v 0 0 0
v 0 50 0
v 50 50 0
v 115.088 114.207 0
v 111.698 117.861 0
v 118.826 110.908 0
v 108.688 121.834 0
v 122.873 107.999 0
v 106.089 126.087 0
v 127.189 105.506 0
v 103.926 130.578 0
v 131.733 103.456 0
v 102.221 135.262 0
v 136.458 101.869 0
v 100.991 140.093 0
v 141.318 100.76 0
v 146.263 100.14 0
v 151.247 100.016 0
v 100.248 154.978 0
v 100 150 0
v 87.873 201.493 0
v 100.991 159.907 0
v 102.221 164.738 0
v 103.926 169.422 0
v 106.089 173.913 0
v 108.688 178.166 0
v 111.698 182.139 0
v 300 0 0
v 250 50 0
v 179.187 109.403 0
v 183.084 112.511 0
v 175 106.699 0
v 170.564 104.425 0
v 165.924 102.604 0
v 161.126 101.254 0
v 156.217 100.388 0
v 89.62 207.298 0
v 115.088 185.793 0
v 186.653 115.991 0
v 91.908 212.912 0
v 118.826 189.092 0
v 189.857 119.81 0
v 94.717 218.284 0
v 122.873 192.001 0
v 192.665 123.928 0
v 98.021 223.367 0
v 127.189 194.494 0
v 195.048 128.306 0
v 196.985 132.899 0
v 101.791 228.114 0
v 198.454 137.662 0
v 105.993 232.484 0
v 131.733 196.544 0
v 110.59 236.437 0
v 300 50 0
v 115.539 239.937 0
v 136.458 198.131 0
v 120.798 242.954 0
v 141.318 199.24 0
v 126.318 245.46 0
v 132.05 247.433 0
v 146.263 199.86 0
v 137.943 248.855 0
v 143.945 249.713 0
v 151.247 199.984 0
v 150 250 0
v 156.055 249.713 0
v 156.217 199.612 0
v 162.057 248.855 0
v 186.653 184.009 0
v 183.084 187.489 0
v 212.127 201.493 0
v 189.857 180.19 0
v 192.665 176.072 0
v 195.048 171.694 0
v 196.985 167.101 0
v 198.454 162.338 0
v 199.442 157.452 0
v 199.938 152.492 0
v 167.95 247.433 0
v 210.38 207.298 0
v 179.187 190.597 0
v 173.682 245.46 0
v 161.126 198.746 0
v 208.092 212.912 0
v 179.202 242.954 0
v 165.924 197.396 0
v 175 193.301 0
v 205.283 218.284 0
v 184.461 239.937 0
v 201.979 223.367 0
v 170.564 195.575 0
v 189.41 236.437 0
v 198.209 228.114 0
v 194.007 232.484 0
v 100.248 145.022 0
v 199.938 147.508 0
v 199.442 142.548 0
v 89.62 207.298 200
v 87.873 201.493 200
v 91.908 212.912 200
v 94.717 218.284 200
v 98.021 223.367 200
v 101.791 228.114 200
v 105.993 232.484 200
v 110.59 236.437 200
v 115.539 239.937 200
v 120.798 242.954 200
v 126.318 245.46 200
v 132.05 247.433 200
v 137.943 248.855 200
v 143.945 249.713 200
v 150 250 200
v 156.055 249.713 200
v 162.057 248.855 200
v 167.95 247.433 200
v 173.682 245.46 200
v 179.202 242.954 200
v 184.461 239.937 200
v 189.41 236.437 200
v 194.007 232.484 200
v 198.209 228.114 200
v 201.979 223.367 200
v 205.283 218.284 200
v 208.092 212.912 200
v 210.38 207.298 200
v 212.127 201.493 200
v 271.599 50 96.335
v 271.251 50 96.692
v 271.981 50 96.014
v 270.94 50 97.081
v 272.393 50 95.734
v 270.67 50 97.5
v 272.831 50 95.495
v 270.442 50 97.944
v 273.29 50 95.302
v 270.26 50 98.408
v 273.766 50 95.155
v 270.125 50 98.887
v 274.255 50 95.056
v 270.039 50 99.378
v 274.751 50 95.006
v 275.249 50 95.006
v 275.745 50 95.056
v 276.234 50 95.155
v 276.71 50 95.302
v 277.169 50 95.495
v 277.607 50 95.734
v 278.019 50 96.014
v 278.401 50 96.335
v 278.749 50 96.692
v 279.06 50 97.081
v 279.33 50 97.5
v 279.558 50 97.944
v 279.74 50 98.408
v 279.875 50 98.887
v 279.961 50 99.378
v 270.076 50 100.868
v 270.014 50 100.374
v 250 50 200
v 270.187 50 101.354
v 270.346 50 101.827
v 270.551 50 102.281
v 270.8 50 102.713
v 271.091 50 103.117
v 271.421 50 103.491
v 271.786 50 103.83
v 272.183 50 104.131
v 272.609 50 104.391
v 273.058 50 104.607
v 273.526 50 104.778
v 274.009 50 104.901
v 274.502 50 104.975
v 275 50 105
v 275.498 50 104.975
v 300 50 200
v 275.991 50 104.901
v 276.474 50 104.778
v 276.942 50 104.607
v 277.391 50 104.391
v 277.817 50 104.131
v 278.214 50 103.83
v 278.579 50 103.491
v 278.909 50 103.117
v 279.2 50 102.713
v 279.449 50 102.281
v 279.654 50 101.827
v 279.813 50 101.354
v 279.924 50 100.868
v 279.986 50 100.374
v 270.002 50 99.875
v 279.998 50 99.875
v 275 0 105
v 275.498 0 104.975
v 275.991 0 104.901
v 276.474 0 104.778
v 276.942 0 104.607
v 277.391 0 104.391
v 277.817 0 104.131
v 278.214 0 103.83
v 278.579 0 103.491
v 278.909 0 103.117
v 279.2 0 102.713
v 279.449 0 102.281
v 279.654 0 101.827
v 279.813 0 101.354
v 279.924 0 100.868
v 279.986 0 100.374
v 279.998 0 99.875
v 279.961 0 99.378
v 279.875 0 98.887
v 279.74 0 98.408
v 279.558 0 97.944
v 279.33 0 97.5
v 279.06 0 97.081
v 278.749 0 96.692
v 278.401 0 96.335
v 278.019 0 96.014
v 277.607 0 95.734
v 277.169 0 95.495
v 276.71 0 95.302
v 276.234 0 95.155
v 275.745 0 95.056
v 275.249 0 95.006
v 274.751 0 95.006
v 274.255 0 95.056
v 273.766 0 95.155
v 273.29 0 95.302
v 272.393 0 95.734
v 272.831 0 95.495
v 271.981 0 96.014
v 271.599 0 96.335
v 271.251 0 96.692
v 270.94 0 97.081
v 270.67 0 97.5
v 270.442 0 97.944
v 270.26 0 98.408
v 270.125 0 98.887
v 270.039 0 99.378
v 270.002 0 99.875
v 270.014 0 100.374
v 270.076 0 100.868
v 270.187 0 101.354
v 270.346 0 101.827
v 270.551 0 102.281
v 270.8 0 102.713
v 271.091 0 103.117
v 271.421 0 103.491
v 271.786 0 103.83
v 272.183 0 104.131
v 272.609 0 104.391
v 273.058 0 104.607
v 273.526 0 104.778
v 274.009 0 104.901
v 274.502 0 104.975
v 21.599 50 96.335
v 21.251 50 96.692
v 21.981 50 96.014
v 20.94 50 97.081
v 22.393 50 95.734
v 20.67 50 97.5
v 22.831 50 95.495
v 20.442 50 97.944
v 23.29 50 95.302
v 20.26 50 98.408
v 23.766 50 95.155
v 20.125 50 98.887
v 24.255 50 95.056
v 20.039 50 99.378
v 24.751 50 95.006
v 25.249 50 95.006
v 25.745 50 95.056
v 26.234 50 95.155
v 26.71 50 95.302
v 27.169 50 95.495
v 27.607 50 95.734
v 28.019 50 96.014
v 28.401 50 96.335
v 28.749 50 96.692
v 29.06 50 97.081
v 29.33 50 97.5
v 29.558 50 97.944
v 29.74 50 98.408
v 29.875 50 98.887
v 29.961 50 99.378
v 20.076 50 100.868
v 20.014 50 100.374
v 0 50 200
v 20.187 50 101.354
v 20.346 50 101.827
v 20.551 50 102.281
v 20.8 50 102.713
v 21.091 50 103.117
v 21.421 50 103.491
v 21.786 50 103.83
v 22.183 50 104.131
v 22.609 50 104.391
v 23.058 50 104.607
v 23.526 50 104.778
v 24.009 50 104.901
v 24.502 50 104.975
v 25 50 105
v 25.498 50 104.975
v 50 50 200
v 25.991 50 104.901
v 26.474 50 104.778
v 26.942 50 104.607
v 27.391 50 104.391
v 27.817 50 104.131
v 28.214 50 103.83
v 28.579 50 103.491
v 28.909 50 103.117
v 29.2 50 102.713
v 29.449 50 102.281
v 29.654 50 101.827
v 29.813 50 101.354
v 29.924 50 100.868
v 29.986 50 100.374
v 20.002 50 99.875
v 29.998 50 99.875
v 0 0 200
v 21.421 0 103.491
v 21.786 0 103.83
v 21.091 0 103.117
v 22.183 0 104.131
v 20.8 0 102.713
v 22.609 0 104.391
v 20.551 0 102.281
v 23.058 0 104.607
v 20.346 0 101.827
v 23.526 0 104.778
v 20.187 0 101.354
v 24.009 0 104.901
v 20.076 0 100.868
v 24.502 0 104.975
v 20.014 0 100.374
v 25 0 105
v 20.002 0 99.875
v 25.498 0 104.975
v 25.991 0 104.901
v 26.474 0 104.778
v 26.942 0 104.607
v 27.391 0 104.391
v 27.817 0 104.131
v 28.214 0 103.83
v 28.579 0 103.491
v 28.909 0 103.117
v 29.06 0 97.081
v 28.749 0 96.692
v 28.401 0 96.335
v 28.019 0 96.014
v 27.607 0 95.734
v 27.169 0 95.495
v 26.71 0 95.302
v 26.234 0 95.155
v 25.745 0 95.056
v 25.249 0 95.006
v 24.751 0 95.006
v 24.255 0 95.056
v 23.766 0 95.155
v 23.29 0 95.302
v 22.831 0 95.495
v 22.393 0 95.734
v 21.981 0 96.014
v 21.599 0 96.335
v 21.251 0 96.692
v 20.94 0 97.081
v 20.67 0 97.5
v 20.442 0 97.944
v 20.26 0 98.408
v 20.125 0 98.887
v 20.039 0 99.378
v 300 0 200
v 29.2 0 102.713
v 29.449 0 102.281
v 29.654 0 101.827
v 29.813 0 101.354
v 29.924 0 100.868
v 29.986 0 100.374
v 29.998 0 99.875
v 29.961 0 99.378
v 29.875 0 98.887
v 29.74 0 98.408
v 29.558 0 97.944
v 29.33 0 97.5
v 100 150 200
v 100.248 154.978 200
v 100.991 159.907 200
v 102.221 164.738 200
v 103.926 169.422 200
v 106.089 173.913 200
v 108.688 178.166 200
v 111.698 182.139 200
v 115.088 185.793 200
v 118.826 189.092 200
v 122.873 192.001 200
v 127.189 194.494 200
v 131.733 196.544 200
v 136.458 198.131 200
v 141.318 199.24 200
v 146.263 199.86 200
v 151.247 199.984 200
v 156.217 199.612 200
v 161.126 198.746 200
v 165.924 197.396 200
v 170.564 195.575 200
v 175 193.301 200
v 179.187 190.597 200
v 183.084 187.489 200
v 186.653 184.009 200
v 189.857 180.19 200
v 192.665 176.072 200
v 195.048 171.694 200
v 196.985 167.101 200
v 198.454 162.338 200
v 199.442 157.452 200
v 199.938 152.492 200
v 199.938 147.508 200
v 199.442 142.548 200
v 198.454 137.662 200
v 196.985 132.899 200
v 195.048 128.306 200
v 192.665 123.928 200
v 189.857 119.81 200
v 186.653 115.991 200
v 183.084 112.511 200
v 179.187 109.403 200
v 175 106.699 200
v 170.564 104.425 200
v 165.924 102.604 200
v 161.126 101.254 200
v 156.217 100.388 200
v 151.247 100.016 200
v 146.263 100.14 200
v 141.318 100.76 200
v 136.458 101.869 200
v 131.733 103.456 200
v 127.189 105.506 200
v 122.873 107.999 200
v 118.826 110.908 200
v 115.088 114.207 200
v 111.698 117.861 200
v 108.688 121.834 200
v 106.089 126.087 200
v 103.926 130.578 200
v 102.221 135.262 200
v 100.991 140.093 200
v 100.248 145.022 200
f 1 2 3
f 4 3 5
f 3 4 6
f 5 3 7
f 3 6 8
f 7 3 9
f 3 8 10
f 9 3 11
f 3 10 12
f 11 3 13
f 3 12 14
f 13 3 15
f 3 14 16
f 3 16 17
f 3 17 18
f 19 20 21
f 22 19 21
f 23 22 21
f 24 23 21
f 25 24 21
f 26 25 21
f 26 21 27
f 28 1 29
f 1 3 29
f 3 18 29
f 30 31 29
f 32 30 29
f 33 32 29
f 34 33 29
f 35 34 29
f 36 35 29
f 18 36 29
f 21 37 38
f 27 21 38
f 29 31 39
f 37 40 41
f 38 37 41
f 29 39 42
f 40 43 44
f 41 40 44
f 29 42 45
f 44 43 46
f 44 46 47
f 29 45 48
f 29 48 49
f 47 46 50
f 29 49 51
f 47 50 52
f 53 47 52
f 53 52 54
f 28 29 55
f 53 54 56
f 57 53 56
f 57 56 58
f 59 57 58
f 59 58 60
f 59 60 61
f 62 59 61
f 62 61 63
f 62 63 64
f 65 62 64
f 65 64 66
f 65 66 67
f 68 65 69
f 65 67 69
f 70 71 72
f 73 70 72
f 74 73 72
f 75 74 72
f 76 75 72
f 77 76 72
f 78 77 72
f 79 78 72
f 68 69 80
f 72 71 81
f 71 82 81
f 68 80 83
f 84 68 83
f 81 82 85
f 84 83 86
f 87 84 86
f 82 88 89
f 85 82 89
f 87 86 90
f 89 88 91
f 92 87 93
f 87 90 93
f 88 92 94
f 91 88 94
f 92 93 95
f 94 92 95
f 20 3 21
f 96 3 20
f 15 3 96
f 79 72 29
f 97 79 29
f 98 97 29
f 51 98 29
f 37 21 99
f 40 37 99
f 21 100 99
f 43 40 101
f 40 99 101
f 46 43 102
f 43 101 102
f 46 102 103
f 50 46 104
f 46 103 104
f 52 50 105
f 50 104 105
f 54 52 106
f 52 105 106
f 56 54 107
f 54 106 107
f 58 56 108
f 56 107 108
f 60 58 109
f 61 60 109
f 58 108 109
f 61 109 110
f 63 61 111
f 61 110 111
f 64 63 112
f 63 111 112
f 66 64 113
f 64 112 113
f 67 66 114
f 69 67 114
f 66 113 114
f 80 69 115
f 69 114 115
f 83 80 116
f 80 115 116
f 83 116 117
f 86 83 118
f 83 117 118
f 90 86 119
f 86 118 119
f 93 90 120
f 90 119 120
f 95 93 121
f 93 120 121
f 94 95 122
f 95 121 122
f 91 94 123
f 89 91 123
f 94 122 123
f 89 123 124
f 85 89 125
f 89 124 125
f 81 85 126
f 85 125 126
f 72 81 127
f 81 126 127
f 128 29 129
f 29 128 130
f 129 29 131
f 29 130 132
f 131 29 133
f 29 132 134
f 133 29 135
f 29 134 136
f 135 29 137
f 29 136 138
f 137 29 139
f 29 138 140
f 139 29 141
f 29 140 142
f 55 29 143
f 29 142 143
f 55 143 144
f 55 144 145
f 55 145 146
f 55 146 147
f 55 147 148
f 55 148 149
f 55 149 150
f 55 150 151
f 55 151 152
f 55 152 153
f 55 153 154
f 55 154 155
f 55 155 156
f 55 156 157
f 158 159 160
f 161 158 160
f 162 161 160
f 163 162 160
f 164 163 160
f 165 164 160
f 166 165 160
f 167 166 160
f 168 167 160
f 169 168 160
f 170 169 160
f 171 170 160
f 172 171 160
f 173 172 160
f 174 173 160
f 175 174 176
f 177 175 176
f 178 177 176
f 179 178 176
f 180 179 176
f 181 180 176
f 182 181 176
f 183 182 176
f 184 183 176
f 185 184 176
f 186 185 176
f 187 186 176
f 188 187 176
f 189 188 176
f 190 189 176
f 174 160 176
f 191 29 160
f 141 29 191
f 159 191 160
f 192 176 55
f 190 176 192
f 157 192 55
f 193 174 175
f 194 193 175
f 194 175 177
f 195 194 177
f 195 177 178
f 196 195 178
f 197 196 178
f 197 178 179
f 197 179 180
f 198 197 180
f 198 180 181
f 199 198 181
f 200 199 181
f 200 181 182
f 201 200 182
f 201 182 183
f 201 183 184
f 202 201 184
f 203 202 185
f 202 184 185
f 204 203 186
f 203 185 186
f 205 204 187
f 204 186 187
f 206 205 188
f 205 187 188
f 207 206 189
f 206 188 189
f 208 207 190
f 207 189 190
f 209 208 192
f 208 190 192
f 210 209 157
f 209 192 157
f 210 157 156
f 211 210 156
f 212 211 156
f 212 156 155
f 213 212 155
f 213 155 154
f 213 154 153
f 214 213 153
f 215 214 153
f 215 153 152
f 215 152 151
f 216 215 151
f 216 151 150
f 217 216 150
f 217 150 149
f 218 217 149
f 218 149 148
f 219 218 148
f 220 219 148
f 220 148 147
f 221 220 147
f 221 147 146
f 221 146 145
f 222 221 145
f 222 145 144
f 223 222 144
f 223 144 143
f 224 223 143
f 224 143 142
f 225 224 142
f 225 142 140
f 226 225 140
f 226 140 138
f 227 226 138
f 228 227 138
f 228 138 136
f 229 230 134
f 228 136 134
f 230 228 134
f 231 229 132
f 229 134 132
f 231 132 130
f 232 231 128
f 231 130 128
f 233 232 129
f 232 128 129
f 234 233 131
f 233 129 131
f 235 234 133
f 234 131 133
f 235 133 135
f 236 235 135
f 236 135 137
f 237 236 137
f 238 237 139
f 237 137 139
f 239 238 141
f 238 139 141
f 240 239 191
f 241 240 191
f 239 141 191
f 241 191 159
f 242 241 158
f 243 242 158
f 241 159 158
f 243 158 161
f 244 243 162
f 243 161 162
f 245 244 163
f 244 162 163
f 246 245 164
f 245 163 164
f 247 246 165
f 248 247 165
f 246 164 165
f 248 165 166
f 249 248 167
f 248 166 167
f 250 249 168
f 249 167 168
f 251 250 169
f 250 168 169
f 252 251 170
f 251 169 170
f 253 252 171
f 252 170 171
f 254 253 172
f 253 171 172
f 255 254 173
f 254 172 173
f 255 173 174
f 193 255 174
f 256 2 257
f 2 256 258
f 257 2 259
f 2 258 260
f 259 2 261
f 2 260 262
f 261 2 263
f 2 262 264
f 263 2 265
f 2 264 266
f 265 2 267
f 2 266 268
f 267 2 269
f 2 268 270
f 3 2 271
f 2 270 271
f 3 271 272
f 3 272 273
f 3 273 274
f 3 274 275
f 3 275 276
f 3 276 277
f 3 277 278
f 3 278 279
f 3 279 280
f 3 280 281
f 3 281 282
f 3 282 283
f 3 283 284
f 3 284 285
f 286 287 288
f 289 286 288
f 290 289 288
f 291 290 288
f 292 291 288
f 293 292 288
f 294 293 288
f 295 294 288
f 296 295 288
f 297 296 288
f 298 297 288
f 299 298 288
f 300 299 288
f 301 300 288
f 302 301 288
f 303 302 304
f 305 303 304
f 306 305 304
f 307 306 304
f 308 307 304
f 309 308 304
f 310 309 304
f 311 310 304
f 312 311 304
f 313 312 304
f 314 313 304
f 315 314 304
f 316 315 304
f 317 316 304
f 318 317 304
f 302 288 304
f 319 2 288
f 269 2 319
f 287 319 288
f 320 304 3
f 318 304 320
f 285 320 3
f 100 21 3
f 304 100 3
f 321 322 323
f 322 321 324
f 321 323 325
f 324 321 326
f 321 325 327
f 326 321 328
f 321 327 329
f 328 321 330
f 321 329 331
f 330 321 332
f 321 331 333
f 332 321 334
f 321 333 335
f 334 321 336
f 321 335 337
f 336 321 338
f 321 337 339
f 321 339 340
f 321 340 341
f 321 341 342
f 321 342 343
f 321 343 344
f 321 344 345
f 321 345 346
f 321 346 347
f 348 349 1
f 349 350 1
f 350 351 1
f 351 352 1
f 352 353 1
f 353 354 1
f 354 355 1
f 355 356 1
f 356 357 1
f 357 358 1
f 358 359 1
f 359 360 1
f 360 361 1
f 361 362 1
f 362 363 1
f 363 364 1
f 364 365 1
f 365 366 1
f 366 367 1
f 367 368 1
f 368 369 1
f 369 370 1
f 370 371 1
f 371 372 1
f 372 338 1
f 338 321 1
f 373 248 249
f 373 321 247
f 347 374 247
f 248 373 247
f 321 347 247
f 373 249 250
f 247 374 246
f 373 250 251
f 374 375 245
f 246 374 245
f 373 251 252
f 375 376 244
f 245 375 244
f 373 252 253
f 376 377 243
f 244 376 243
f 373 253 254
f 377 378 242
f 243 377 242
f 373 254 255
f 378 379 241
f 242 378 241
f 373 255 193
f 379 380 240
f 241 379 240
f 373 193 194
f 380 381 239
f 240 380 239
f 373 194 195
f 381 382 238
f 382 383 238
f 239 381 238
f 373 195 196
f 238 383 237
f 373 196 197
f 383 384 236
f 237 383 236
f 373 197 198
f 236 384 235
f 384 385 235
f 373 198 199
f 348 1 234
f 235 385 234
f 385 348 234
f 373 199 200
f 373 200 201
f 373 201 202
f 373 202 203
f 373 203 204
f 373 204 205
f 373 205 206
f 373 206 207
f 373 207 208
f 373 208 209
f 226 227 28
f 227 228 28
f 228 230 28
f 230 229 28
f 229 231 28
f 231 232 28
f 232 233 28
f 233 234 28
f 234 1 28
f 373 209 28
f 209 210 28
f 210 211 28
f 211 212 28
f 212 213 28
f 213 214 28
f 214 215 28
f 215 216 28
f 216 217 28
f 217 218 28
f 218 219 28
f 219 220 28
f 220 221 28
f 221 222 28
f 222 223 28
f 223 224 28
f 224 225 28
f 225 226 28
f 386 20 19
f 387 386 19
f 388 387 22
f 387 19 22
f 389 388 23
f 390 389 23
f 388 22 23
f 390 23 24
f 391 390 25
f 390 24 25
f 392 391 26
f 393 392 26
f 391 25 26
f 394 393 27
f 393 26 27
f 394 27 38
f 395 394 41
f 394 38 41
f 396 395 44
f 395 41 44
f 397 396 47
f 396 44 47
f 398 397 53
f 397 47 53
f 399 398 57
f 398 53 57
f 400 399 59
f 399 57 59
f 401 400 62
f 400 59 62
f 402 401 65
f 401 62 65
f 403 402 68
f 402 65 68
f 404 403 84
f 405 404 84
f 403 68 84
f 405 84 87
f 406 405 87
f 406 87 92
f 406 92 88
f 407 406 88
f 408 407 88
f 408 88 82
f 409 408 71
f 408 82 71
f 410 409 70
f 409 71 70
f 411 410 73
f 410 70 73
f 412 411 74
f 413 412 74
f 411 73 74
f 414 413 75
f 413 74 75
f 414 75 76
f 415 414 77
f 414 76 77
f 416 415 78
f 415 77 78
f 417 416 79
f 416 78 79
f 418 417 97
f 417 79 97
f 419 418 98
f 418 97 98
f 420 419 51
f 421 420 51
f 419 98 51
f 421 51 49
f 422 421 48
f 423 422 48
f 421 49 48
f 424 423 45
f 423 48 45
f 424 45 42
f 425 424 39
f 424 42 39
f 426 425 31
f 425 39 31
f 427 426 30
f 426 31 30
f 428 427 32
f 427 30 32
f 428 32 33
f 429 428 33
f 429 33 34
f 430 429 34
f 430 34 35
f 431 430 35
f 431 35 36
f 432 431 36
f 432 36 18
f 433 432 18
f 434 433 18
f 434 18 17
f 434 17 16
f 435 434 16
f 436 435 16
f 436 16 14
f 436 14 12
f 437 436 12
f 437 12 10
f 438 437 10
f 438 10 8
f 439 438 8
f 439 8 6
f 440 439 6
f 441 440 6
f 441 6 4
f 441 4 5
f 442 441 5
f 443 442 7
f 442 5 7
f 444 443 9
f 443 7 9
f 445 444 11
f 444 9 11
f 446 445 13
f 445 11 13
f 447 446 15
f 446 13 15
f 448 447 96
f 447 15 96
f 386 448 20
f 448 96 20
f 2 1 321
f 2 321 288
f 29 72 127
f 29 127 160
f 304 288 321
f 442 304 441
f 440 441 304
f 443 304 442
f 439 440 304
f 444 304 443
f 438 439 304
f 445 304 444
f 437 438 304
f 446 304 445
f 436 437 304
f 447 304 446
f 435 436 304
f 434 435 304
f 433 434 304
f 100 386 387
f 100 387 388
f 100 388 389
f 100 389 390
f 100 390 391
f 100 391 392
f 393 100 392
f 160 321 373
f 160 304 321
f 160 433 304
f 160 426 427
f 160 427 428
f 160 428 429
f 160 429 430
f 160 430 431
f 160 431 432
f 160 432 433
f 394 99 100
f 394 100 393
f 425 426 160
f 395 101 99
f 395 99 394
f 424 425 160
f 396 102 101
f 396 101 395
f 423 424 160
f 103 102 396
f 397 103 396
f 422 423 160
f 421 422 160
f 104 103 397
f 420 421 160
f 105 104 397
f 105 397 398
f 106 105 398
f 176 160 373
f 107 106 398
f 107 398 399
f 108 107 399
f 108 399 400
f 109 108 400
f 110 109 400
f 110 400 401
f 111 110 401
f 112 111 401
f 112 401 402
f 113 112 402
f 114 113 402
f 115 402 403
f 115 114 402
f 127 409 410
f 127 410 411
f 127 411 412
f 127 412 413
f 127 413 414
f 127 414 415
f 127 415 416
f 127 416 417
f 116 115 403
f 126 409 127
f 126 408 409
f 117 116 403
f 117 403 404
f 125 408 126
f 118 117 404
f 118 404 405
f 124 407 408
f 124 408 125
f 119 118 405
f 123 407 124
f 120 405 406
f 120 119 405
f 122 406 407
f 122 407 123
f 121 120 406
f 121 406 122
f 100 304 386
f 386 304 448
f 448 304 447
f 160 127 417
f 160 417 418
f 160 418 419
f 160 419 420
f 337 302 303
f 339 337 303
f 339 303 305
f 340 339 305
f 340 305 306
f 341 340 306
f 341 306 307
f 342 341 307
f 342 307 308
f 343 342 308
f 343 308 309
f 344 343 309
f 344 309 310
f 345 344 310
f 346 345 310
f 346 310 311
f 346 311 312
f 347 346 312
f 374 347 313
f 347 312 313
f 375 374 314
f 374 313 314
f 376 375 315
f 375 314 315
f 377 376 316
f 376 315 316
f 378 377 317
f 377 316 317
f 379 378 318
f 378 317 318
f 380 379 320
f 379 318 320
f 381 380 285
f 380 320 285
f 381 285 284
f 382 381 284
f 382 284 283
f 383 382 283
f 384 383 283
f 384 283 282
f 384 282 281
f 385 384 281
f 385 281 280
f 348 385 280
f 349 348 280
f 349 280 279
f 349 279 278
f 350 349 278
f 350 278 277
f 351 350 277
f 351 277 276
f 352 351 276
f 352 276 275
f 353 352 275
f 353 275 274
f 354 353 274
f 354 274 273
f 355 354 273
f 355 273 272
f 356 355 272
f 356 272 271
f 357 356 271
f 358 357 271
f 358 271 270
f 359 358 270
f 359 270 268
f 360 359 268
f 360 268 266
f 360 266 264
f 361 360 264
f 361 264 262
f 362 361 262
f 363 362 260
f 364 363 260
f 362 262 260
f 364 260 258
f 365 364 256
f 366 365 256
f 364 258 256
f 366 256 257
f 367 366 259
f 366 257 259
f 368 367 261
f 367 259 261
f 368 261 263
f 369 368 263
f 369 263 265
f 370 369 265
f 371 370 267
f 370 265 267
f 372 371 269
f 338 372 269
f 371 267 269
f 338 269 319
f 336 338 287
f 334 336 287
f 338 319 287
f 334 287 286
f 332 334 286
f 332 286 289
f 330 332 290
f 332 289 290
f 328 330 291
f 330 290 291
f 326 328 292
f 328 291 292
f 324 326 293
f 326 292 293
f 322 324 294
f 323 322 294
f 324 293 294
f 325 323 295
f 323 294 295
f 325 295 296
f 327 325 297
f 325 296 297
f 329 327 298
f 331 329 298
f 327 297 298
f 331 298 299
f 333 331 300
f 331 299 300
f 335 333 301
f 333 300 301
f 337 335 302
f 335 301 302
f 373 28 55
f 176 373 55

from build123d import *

# Parameters (mm, degrees)
SKETCH1_W           = 300
SKETCH1_H           = 250
BOSS_EXTRUDE1_DEPTH = 200
SKETCH2_W           = 50
SKETCH2_H           = 200
CUT_EXTRUDE1_DEPTH  = 200
SKETCH3_W           = 50
SKETCH3_H           = 200
CUT_EXTRUDE2_DEPTH  = 200
CUT_EXTRUDE3_DEPTH  = 200
CUT_EXTRUDE4_DEPTH  = 200
FILLET1_R           = 64.03882
SKETCH6_R           = 50
CUT_EXTRUDE5_DEPTH  = 200
SKETCH8_R           = 5
CUT_EXTRUDE6_DEPTH  = 200
SKETCH9_R           = 5
CUT_EXTRUDE7_DEPTH  = 200


with BuildPart() as part:
    # Sketch1 → Boss-Extrude1 (new body)
    with BuildSketch(Plane.XY):
        with Locations((150, 125)):
            Rectangle(SKETCH1_W, SKETCH1_H)
    extrude(amount=BOSS_EXTRUDE1_DEPTH)

    # Sketch2 → Cut-Extrude1 (cut)
    with BuildSketch(Plane.XY.offset(200)):
        with Locations((25, 150)):
            Rectangle(SKETCH2_W, SKETCH2_H)
    extrude(amount=-CUT_EXTRUDE1_DEPTH, mode=Mode.SUBTRACT)

    # Sketch3 → Cut-Extrude2 (cut)
    with BuildSketch(Plane.XY.offset(200)):
        with Locations((275, 150)):
            Rectangle(SKETCH3_W, SKETCH3_H)
    extrude(amount=-CUT_EXTRUDE2_DEPTH, mode=Mode.SUBTRACT)

    # Sketch4 → Cut-Extrude3 (cut)
    with BuildSketch(Plane(origin=(0, 0, 0), x_dir=(-1, 0, 0), z_dir=(0, 0, -1))):
        Polygon((-50, 250), (-100, 250), (-50, 50), align=None)
    extrude(amount=-CUT_EXTRUDE3_DEPTH, mode=Mode.SUBTRACT)

    # Sketch5 → Cut-Extrude4 (cut)
    with BuildSketch(Plane(origin=(0, 0, 0), x_dir=(-1, 0, 0), z_dir=(0, 0, -1))):
        Polygon((-250, 250), (-200, 250), (-250, 50), align=None)
    extrude(amount=-CUT_EXTRUDE4_DEPTH, mode=Mode.SUBTRACT)

    # Fillet1
    fillet1_edges = [part.edges().sort_by_distance(p)[0] for p in [
        (100, 250, 100),
        (200, 250, 100),
    ]]
    fillet(fillet1_edges, radius=FILLET1_R)

    # Sketch6 → Cut-Extrude5 (cut)
    with BuildSketch(Plane(origin=(0, 0, 0), x_dir=(-1, 0, 0), z_dir=(0, 0, -1))):
        with Locations((-150, 150)):
            Circle(SKETCH6_R)
    extrude(amount=-CUT_EXTRUDE5_DEPTH, mode=Mode.SUBTRACT)

    # Sketch8 → Cut-Extrude6 (cut)
    with BuildSketch(Plane(origin=(0, 50, 0), x_dir=(1, 0, 0), z_dir=(0, 1, 0))):
        with Locations(Location((25, -100, 0), (0, 0, 270))):
            Circle(SKETCH8_R)
    extrude(amount=-CUT_EXTRUDE6_DEPTH, mode=Mode.SUBTRACT)

    # Sketch9 → Cut-Extrude7 (cut)
    with BuildSketch(Plane(origin=(0, 50, 0), x_dir=(1, 0, 0), z_dir=(0, 1, 0))):
        with Locations(Location((275, -100, 0), (0, 0, 270))):
            Circle(SKETCH9_R)
    extrude(amount=-CUT_EXTRUDE7_DEPTH, mode=Mode.SUBTRACT)


solid = part.part
